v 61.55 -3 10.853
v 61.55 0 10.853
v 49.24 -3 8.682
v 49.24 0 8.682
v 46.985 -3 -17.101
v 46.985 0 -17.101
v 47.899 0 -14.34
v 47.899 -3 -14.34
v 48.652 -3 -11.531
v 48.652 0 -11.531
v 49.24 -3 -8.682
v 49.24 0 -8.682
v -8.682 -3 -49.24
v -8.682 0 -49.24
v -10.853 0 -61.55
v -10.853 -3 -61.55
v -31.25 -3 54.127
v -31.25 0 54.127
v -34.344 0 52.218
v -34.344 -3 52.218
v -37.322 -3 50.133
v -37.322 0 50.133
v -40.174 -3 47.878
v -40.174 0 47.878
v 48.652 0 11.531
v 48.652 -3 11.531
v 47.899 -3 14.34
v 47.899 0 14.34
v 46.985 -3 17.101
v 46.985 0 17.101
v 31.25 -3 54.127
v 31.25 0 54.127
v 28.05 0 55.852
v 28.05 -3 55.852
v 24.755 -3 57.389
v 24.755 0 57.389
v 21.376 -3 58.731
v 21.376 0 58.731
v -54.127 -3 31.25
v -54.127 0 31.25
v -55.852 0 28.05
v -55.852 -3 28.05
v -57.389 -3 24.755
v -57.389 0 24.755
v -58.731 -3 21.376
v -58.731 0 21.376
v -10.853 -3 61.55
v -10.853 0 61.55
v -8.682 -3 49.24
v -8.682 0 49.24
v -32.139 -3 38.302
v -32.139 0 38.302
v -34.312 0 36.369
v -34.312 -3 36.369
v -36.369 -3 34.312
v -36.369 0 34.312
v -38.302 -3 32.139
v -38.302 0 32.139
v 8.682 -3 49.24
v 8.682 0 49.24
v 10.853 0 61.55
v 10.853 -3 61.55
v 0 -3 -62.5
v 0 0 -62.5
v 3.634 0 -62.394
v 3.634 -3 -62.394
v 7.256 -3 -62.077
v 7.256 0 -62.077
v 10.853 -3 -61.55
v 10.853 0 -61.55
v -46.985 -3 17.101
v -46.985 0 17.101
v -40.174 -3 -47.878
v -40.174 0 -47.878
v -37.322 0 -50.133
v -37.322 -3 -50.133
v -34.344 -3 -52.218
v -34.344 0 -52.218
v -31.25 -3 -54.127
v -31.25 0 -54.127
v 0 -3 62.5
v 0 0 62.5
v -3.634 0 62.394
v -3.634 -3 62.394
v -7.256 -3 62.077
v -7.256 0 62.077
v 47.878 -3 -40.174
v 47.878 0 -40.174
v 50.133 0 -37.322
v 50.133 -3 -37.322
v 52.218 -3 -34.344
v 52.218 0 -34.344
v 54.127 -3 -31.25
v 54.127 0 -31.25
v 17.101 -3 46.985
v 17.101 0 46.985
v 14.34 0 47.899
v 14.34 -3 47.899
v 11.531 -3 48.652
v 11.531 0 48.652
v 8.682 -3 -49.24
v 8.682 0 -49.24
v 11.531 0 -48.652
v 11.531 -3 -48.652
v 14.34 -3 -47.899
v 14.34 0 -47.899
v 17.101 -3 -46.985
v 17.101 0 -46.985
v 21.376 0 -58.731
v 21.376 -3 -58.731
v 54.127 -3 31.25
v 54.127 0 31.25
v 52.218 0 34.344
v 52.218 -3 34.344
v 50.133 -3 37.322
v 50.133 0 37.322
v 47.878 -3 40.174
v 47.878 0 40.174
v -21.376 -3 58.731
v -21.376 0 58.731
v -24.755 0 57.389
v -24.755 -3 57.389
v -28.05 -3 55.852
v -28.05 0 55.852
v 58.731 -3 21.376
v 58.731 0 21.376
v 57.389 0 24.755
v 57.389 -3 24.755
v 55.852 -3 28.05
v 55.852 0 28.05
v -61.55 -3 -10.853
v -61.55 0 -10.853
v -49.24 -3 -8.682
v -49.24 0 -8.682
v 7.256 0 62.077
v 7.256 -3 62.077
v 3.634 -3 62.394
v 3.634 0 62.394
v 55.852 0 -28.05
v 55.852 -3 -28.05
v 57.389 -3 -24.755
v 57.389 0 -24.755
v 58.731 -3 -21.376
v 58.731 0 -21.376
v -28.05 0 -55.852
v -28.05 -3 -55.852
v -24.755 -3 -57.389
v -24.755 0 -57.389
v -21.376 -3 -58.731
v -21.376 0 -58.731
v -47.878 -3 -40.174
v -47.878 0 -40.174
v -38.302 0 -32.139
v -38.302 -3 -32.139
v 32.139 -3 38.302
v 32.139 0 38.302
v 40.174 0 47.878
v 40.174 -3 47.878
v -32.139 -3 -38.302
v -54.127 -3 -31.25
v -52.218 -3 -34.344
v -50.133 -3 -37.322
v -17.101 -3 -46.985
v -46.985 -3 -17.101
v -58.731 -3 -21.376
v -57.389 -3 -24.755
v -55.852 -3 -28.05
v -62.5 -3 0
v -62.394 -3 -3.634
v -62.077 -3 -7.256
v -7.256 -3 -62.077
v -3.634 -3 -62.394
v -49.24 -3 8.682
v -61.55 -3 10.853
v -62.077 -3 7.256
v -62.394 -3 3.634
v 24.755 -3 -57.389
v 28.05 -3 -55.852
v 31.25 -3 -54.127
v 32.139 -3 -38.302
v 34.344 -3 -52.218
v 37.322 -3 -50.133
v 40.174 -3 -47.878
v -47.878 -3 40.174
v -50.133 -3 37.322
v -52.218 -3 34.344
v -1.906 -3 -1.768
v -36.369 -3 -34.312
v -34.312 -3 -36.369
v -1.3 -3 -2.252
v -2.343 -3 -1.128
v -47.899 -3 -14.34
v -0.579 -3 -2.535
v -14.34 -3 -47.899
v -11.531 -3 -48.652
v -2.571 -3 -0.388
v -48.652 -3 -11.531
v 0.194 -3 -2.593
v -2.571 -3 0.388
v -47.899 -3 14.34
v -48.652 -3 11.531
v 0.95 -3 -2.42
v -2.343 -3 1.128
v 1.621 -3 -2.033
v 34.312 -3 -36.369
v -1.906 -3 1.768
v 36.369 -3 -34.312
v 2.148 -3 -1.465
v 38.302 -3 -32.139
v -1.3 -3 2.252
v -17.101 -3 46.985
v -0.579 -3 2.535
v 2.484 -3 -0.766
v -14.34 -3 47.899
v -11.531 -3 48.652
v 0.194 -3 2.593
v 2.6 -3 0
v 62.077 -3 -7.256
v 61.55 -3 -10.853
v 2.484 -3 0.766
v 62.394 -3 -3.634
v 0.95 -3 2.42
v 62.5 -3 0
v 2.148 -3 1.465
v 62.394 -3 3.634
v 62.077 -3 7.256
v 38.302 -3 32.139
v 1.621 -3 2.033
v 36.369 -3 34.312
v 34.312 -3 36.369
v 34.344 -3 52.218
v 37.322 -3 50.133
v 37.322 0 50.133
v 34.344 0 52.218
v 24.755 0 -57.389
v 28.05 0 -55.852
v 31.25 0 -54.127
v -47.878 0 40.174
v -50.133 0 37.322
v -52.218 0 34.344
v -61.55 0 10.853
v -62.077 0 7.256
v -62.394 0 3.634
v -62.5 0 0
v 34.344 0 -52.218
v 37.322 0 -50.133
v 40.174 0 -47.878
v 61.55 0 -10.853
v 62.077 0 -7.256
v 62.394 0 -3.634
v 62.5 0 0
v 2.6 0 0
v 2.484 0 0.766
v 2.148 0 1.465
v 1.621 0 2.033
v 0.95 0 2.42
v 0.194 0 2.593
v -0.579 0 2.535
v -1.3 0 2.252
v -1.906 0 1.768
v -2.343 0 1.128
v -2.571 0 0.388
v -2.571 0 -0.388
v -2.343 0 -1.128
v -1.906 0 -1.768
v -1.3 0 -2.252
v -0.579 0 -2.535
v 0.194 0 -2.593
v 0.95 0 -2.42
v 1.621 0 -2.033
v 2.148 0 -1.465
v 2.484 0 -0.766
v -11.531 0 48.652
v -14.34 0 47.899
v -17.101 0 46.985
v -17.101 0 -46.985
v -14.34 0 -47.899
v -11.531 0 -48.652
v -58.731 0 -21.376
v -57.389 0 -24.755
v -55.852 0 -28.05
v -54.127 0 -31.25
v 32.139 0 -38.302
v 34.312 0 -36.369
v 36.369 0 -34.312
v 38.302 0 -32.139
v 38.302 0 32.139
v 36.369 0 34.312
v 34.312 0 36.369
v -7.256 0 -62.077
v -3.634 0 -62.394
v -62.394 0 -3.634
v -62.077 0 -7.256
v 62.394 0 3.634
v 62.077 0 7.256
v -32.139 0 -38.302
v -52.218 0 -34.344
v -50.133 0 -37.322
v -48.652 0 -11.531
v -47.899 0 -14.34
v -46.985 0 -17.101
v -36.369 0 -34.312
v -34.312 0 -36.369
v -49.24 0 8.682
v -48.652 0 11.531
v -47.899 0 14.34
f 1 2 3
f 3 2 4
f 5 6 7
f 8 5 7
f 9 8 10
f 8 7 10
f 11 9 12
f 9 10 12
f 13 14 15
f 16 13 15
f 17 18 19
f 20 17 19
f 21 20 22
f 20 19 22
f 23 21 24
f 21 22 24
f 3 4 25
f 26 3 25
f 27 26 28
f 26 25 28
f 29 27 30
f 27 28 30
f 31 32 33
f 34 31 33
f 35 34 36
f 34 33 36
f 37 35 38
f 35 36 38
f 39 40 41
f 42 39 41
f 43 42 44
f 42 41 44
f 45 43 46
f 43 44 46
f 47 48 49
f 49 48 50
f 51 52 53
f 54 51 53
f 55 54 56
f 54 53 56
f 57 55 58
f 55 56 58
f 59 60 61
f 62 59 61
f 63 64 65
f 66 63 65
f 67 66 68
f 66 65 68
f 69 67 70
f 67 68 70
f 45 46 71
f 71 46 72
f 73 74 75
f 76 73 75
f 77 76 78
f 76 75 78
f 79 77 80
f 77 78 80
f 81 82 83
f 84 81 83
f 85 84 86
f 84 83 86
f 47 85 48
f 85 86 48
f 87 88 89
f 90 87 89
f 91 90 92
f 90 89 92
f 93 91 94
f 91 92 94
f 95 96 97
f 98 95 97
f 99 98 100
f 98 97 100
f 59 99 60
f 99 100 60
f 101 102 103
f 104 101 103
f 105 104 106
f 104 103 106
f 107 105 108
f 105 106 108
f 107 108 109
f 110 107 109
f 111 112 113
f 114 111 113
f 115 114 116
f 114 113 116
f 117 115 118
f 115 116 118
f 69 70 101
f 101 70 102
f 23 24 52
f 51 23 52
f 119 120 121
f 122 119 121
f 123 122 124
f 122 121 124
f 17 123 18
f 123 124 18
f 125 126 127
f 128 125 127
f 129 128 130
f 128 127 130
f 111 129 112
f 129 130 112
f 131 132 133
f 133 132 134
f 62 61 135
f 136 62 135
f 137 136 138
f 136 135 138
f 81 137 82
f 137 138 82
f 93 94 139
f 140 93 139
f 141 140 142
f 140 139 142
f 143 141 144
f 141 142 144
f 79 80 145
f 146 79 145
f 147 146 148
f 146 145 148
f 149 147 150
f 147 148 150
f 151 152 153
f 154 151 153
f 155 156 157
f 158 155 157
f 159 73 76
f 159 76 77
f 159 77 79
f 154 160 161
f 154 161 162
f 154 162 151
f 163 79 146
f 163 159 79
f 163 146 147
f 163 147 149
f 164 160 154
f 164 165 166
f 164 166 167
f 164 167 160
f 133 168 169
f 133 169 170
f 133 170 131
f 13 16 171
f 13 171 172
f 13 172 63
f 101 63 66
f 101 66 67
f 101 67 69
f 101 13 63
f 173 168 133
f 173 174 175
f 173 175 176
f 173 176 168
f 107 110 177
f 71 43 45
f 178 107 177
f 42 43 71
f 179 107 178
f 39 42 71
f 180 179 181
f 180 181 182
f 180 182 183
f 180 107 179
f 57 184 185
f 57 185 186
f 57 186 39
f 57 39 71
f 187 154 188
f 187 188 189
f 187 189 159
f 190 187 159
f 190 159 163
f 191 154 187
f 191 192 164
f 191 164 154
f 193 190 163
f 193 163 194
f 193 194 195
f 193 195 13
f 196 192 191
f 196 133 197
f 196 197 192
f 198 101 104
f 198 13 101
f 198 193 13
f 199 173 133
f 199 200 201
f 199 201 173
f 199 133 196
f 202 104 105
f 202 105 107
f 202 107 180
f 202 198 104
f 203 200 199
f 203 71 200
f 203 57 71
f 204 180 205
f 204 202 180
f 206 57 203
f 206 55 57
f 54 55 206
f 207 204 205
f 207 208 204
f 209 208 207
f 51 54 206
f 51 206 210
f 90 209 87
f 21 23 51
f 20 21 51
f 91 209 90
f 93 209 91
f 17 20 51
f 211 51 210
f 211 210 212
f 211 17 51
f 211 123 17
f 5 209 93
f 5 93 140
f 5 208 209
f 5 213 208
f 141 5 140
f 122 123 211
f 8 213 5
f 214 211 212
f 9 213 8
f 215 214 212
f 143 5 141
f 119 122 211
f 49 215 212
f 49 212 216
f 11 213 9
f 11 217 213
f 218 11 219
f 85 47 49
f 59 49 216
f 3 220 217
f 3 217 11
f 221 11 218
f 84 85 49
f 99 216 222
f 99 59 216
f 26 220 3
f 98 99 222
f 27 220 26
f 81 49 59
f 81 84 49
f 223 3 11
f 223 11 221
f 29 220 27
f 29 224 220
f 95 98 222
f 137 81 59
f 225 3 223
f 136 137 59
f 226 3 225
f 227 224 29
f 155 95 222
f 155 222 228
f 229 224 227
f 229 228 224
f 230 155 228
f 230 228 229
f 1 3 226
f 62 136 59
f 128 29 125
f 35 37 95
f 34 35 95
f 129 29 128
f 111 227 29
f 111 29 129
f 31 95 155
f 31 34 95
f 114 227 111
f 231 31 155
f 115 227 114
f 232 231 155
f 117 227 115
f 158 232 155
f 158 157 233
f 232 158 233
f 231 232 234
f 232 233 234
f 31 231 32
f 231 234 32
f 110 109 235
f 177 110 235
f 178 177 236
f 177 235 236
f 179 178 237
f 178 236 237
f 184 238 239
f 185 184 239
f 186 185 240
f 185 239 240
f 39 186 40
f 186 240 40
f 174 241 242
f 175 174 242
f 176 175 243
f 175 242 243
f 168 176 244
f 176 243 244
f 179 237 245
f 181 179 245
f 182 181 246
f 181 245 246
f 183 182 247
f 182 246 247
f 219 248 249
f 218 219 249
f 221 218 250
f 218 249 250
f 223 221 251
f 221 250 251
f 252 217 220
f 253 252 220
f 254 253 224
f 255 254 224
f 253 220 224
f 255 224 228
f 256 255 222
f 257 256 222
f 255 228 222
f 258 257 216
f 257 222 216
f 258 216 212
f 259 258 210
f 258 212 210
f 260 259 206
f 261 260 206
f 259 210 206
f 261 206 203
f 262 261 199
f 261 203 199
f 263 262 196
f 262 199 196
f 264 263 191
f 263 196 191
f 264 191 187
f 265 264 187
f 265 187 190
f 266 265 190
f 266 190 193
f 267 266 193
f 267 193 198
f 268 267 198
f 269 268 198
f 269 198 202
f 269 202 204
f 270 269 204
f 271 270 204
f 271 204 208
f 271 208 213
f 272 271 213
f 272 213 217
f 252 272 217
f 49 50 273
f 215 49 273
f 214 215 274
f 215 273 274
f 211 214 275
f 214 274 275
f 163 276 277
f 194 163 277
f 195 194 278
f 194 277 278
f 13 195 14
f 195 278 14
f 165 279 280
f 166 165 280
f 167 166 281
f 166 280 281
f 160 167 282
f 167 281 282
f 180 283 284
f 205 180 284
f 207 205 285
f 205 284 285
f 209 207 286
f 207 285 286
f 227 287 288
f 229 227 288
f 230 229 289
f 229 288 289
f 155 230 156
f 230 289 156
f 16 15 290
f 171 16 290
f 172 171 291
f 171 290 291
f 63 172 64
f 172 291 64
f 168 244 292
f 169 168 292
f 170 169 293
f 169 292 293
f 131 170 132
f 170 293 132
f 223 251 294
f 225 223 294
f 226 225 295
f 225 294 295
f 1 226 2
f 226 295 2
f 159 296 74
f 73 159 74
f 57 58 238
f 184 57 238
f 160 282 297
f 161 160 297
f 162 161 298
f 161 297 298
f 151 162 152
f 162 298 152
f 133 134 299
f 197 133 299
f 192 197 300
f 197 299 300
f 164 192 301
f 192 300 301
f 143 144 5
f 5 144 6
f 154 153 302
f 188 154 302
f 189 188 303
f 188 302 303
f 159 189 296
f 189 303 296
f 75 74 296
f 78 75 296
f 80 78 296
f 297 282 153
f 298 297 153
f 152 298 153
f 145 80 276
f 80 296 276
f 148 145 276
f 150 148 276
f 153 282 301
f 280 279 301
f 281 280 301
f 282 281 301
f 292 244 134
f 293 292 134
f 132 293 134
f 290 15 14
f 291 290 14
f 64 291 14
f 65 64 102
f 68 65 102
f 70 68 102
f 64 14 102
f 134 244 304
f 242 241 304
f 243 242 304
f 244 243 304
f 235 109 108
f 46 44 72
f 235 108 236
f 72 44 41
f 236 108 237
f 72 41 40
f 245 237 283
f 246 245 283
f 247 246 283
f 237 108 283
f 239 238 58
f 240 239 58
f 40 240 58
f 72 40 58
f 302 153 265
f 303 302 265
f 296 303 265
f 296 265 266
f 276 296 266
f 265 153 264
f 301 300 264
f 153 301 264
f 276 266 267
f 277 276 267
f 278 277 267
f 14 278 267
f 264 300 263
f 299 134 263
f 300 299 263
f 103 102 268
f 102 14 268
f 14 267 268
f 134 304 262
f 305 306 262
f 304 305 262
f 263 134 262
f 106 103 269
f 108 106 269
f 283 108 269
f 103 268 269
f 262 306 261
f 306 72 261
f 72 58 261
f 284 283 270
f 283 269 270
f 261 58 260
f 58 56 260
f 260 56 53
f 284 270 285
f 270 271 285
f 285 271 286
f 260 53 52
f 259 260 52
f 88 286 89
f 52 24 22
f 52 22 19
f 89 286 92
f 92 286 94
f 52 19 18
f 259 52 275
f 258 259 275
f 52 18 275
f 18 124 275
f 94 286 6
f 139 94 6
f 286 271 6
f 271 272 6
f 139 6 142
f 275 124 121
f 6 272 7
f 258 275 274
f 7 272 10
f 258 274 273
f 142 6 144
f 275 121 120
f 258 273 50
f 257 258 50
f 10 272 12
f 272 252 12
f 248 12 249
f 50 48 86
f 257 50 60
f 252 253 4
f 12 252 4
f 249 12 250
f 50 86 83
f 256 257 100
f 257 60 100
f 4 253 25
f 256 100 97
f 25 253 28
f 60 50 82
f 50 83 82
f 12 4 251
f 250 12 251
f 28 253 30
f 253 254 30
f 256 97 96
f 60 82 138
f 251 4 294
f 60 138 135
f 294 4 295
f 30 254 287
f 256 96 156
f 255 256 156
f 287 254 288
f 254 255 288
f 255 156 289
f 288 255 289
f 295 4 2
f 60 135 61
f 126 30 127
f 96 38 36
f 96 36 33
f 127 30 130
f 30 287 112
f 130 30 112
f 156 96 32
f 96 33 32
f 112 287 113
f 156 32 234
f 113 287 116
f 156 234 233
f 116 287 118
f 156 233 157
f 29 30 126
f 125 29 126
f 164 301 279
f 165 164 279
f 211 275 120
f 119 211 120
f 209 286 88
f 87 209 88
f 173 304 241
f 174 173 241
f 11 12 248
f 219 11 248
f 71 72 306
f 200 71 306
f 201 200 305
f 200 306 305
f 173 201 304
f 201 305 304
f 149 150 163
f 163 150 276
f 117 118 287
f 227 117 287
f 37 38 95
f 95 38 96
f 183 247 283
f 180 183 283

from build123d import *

# Parameters (mm, degrees)
F1_DEPTH = 3
F2_R     = 2.6
F3_DEPTH = 3.001


with BuildPart() as f1:
    # F0 (on Front) → F1 (new body)
    with BuildSketch(Plane.XZ):
        with BuildLine():
            Line((0, 0), (50, 0))
            ThreePointArc((50, 0), (49.8097349046, 4.3577871374), (49.2403876506, 8.6824088833))
            Line((49.2403876506, 8.6824088833), (0, 0))
        make_face()
        with BuildLine():
            Line((62.5, 0), (50, 0))
            ThreePointArc((50, 0), (49.8097349046, -4.3577871374), (49.2403876506, -8.6824088833))
            Line((49.2403876506, -8.6824088833), (61.5504845633, -10.8530111042))
            ThreePointArc((61.5504845633, -10.8530111042), (62.2621686307, -5.4472339217), (62.5, 0))
        make_face()
        with BuildLine():
            ThreePointArc((49.2403876506, -8.6824088833), (49.8097349046, -4.3577871374), (50, 0))
            Line((50, 0), (0, 0))
            Line((0, 0), (49.2403876506, -8.6824088833))
        make_face()
        with BuildLine():
            ThreePointArc((49.2403876506, 8.6824088833), (49.8097349046, 4.3577871374), (50, 0))
            Line((50, 0), (62.5, 0))
            ThreePointArc((62.5, 0), (62.2621686307, 5.4472339217), (61.5504845633, 10.8530111042))
            Line((61.5504845633, 10.8530111042), (49.2403876506, 8.6824088833))
        make_face()
        with BuildLine():
            Line((0, 0), (49.2403876506, 8.6824088833))
            ThreePointArc((49.2403876506, 8.6824088833), (48.2962913145, 12.9409522551), (46.9846310393, 17.1010071663))
            Line((46.9846310393, 17.1010071663), (0, 0))
        make_face()
        with BuildLine():
            ThreePointArc((46.9846310393, -17.1010071663), (48.2962913145, -12.9409522551), (49.2403876506, -8.6824088833))
            Line((49.2403876506, -8.6824088833), (0, 0))
            Line((0, 0), (46.9846310393, -17.1010071663))
        make_face()
        with BuildLine():
            Line((-8.6824088833, 49.2403876506), (0, 0))
            Line((0, 0), (0, 50))
            ThreePointArc((0, 50), (-4.3577871374, 49.8097349046), (-8.6824088833, 49.2403876506))
        make_face()
        with BuildLine():
            Line((8.6824088833, -49.2403876506), (0, 0))
            Line((0, 0), (0, -50))
            ThreePointArc((0, -50), (4.3577871374, -49.8097349046), (8.6824088833, -49.2403876506))
        make_face()
        with BuildLine():
            Line((-49.2403876506, -8.6824088833), (0, 0))
            Line((0, 0), (-50, 0))
            ThreePointArc((-50, 0), (-49.8097349046, -4.3577871374), (-49.2403876506, -8.6824088833))
        make_face()
        with BuildLine():
            Line((17.1010071663, 46.9846310393), (0, 0))
            Line((0, 0), (25, 43.3012701892))
            ThreePointArc((25, 43.3012701892), (21.130913087, 45.3153893518), (17.1010071663, 46.9846310393))
        make_face()
        with BuildLine():
            Line((38.3022221559, 32.1393804843), (0, 0))
            Line((0, 0), (43.3012701892, 25))
            ThreePointArc((43.3012701892, 25), (40.9576022144, 28.6788218176), (38.3022221559, 32.1393804843))
        make_face()
        with BuildLine():
            Line((46.9846310393, -17.1010071663), (0, 0))
            Line((0, 0), (43.3012701892, -25))
            ThreePointArc((43.3012701892, -25), (45.3153893518, -21.130913087), (46.9846310393, -17.1010071663))
        make_face()
        with BuildLine():
            Line((32.1393804843, -38.3022221559), (0, 0))
            Line((0, 0), (25, -43.3012701892))
            ThreePointArc((25, -43.3012701892), (28.6788218176, -40.9576022144), (32.1393804843, -38.3022221559))
        make_face()
        with BuildLine():
            Line((-32.1393804843, 38.3022221559), (0, 0))
            Line((0, 0), (-25, 43.3012701892))
            ThreePointArc((-25, 43.3012701892), (-28.6788218176, 40.9576022144), (-32.1393804843, 38.3022221559))
        make_face()
        with BuildLine():
            Line((-46.9846310393, 17.1010071663), (0, 0))
            Line((0, 0), (-43.3012701892, 25))
            ThreePointArc((-43.3012701892, 25), (-45.3153893518, 21.130913087), (-46.9846310393, 17.1010071663))
        make_face()
        with BuildLine():
            Line((-38.3022221559, -32.1393804843), (0, 0))
            Line((0, 0), (-43.3012701892, -25))
            ThreePointArc((-43.3012701892, -25), (-40.9576022144, -28.6788218176), (-38.3022221559, -32.1393804843))
        make_face()
        with BuildLine():
            Line((-17.1010071663, -46.9846310393), (0, 0))
            Line((0, 0), (-25, -43.3012701892))
            ThreePointArc((-25, -43.3012701892), (-21.130913087, -45.3153893518), (-17.1010071663, -46.9846310393))
        make_face()
        with BuildLine():
            Line((-17.1010071663, 46.9846310393), (0, 0))
            Line((0, 0), (-8.6824088833, 49.2403876506))
            ThreePointArc((-8.6824088833, 49.2403876506), (-12.9409522551, 48.2962913145), (-17.1010071663, 46.9846310393))
        make_face()
        with BuildLine():
            Line((0, 50), (0, 0))
            Line((0, 0), (8.6824088833, 49.2403876506))
            ThreePointArc((8.6824088833, 49.2403876506), (4.3577871374, 49.8097349046), (0, 50))
        make_face()
        with BuildLine():
            Line((8.6824088833, 49.2403876506), (0, 0))
            Line((0, 0), (17.1010071663, 46.9846310393))
            ThreePointArc((17.1010071663, 46.9846310393), (12.9409522551, 48.2962913145), (8.6824088833, 49.2403876506))
        make_face()
        with BuildLine():
            Line((25, 43.3012701892), (0, 0))
            Line((0, 0), (32.1393804843, 38.3022221559))
            ThreePointArc((32.1393804843, 38.3022221559), (28.6788218176, 40.9576022144), (25, 43.3012701892))
        make_face()
        with BuildLine():
            Line((32.1393804843, 38.3022221559), (0, 0))
            Line((0, 0), (38.3022221559, 32.1393804843))
            ThreePointArc((38.3022221559, 32.1393804843), (35.3553390593, 35.3553390593), (32.1393804843, 38.3022221559))
        make_face()
        with BuildLine():
            Line((43.3012701892, 25), (0, 0))
            Line((0, 0), (46.9846310393, 17.1010071663))
            ThreePointArc((46.9846310393, 17.1010071663), (45.3153893518, 21.130913087), (43.3012701892, 25))
        make_face()
        with BuildLine():
            Line((43.3012701892, -25), (0, 0))
            Line((0, 0), (38.3022221559, -32.1393804843))
            ThreePointArc((38.3022221559, -32.1393804843), (40.9576022144, -28.6788218176), (43.3012701892, -25))
        make_face()
        with BuildLine():
            Line((38.3022221559, -32.1393804843), (0, 0))
            Line((0, 0), (32.1393804843, -38.3022221559))
            ThreePointArc((32.1393804843, -38.3022221559), (35.3553390593, -35.3553390593), (38.3022221559, -32.1393804843))
        make_face()
        with BuildLine():
            Line((25, -43.3012701892), (0, 0))
            Line((0, 0), (17.1010071663, -46.9846310393))
            ThreePointArc((17.1010071663, -46.9846310393), (21.130913087, -45.3153893518), (25, -43.3012701892))
        make_face()
        with BuildLine():
            Line((17.1010071663, -46.9846310393), (0, 0))
            Line((0, 0), (8.6824088833, -49.2403876506))
            ThreePointArc((8.6824088833, -49.2403876506), (12.9409522551, -48.2962913145), (17.1010071663, -46.9846310393))
        make_face()
        with BuildLine():
            Line((0, -50), (0, 0))
            Line((0, 0), (-8.6824088833, -49.2403876506))
            ThreePointArc((-8.6824088833, -49.2403876506), (-4.3577871374, -49.8097349046), (0, -50))
        make_face()
        with BuildLine():
            Line((-8.6824088833, -49.2403876506), (0, 0))
            Line((0, 0), (-17.1010071663, -46.9846310393))
            ThreePointArc((-17.1010071663, -46.9846310393), (-12.9409522551, -48.2962913145), (-8.6824088833, -49.2403876506))
        make_face()
        with BuildLine():
            Line((-25, -43.3012701892), (0, 0))
            Line((0, 0), (-32.1393804843, -38.3022221559))
            ThreePointArc((-32.1393804843, -38.3022221559), (-28.6788218176, -40.9576022144), (-25, -43.3012701892))
        make_face()
        with BuildLine():
            Line((-32.1393804843, -38.3022221559), (0, 0))
            Line((0, 0), (-38.3022221559, -32.1393804843))
            ThreePointArc((-38.3022221559, -32.1393804843), (-35.3553390593, -35.3553390593), (-32.1393804843, -38.3022221559))
        make_face()
        with BuildLine():
            Line((-43.3012701892, -25), (0, 0))
            Line((0, 0), (-46.9846310393, -17.1010071663))
            ThreePointArc((-46.9846310393, -17.1010071663), (-45.3153893518, -21.130913087), (-43.3012701892, -25))
        make_face()
        with BuildLine():
            Line((-46.9846310393, -17.1010071663), (0, 0))
            Line((0, 0), (-49.2403876506, -8.6824088833))
            ThreePointArc((-49.2403876506, -8.6824088833), (-48.2962913145, -12.9409522551), (-46.9846310393, -17.1010071663))
        make_face()
        with BuildLine():
            Line((-49.2403876506, 8.6824088833), (0, 0))
            Line((0, 0), (-46.9846310393, 17.1010071663))
            ThreePointArc((-46.9846310393, 17.1010071663), (-48.2962913145, 12.9409522551), (-49.2403876506, 8.6824088833))
        make_face()
        with BuildLine():
            Line((-43.3012701892, 25), (0, 0))
            Line((0, 0), (-38.3022221559, 32.1393804843))
            ThreePointArc((-38.3022221559, 32.1393804843), (-40.9576022144, 28.6788218176), (-43.3012701892, 25))
        make_face()
        with BuildLine():
            Line((-38.3022221559, 32.1393804843), (0, 0))
            Line((0, 0), (-32.1393804843, 38.3022221559))
            ThreePointArc((-32.1393804843, 38.3022221559), (-35.3553390593, 35.3553390593), (-38.3022221559, 32.1393804843))
        make_face()
        with BuildLine():
            Line((-25, 43.3012701892), (0, 0))
            Line((0, 0), (-17.1010071663, 46.9846310393))
            ThreePointArc((-17.1010071663, 46.9846310393), (-21.130913087, 45.3153893518), (-25, 43.3012701892))
        make_face()
        with BuildLine():
            Line((-50, 0), (0, 0))
            Line((0, 0), (-49.2403876506, 8.6824088833))
            ThreePointArc((-49.2403876506, 8.6824088833), (-49.8097349046, 4.3577871374), (-50, 0))
        make_face()
        with BuildLine():
            ThreePointArc((43.3012701892, 25), (45.3153893518, 21.130913087), (46.9846310393, 17.1010071663))
            Line((46.9846310393, 17.1010071663), (58.7307887991, 21.3762589579))
            ThreePointArc((58.7307887991, 21.3762589579), (56.6442366898, 26.4136413588), (54.1265877365, 31.25))
            Line((54.1265877365, 31.25), (43.3012701892, 25))
        make_face()
        with BuildLine():
            Line((58.7307887991, -21.3762589579), (46.9846310393, -17.1010071663))
            ThreePointArc((46.9846310393, -17.1010071663), (45.3153893518, -21.130913087), (43.3012701892, -25))
            Line((43.3012701892, -25), (54.1265877365, -31.25))
            ThreePointArc((54.1265877365, -31.25), (56.6442366898, -26.4136413588), (58.7307887991, -21.3762589579))
        make_face()
        with BuildLine():
            Line((0, 62.5), (0, 50))
            ThreePointArc((0, 50), (4.3577871374, 49.8097349046), (8.6824088833, 49.2403876506))
            Line((8.6824088833, 49.2403876506), (10.8530111042, 61.5504845633))
            ThreePointArc((10.8530111042, 61.5504845633), (5.4472339217, 62.2621686307), (0, 62.5))
        make_face()
        with BuildLine():
            ThreePointArc((-8.6824088833, 49.2403876506), (-4.3577871374, 49.8097349046), (0, 50))
            Line((0, 50), (0, 62.5))
            ThreePointArc((0, 62.5), (-5.4472339217, 62.2621686307), (-10.8530111042, 61.5504845633))
            Line((-10.8530111042, 61.5504845633), (-8.6824088833, 49.2403876506))
        make_face()
        with BuildLine():
            Line((0, -62.5), (0, -50))
            ThreePointArc((0, -50), (-4.3577871374, -49.8097349046), (-8.6824088833, -49.2403876506))
            Line((-8.6824088833, -49.2403876506), (-10.8530111042, -61.5504845633))
            ThreePointArc((-10.8530111042, -61.5504845633), (-5.4472339217, -62.2621686307), (0, -62.5))
        make_face()
        with BuildLine():
            ThreePointArc((8.6824088833, -49.2403876506), (4.3577871374, -49.8097349046), (0, -50))
            Line((0, -50), (0, -62.5))
            ThreePointArc((0, -62.5), (5.4472339217, -62.2621686307), (10.8530111042, -61.5504845633))
            Line((10.8530111042, -61.5504845633), (8.6824088833, -49.2403876506))
        make_face()
        with BuildLine():
            Line((-62.5, 0), (-50, 0))
            ThreePointArc((-50, 0), (-49.8097349046, 4.3577871374), (-49.2403876506, 8.6824088833))
            Line((-49.2403876506, 8.6824088833), (-61.5504845633, 10.8530111042))
            ThreePointArc((-61.5504845633, 10.8530111042), (-62.2621686307, 5.4472339217), (-62.5, 0))
        make_face()
        with BuildLine():
            ThreePointArc((-49.2403876506, -8.6824088833), (-49.8097349046, -4.3577871374), (-50, 0))
            Line((-50, 0), (-62.5, 0))
            ThreePointArc((-62.5, 0), (-62.2621686307, -5.4472339217), (-61.5504845633, -10.8530111042))
            Line((-61.5504845633, -10.8530111042), (-49.2403876506, -8.6824088833))
        make_face()
        with BuildLine():
            Line((31.25, 54.1265877365), (25, 43.3012701892))
            ThreePointArc((25, 43.3012701892), (28.6788218176, 40.9576022144), (32.1393804843, 38.3022221559))
            Line((32.1393804843, 38.3022221559), (40.1742256054, 47.8777776949))
            ThreePointArc((40.1742256054, 47.8777776949), (35.8485272719, 51.1970027681), (31.25, 54.1265877365))
        make_face()
        with BuildLine():
            ThreePointArc((17.1010071663, 46.9846310393), (21.130913087, 45.3153893518), (25, 43.3012701892))
            Line((25, 43.3012701892), (31.25, 54.1265877365))
            ThreePointArc((31.25, 54.1265877365), (26.4136413588, 56.6442366898), (21.3762589579, 58.7307887991))
            Line((21.3762589579, 58.7307887991), (17.1010071663, 46.9846310393))
        make_face()
        with BuildLine():
            ThreePointArc((38.3022221559, 32.1393804843), (40.9576022144, 28.6788218176), (43.3012701892, 25))
            Line((43.3012701892, 25), (54.1265877365, 31.25))
            ThreePointArc((54.1265877365, 31.25), (51.1970027681, 35.8485272719), (47.8777776949, 40.1742256054))
            Line((47.8777776949, 40.1742256054), (38.3022221559, 32.1393804843))
        make_face()
        with BuildLine():
            Line((54.1265877365, -31.25), (43.3012701892, -25))
            ThreePointArc((43.3012701892, -25), (40.9576022144, -28.6788218176), (38.3022221559, -32.1393804843))
            Line((38.3022221559, -32.1393804843), (47.8777776949, -40.1742256054))
            ThreePointArc((47.8777776949, -40.1742256054), (51.1970027681, -35.8485272719), (54.1265877365, -31.25))
        make_face()
        with BuildLine():
            Line((31.25, -54.1265877365), (25, -43.3012701892))
            ThreePointArc((25, -43.3012701892), (21.130913087, -45.3153893518), (17.1010071663, -46.9846310393))
            Line((17.1010071663, -46.9846310393), (21.3762589579, -58.7307887991))
            ThreePointArc((21.3762589579, -58.7307887991), (26.4136413588, -56.6442366898), (31.25, -54.1265877365))
        make_face()
        with BuildLine():
            ThreePointArc((32.1393804843, -38.3022221559), (28.6788218176, -40.9576022144), (25, -43.3012701892))
            Line((25, -43.3012701892), (31.25, -54.1265877365))
            ThreePointArc((31.25, -54.1265877365), (35.8485272719, -51.1970027681), (40.1742256054, -47.8777776949))
            Line((40.1742256054, -47.8777776949), (32.1393804843, -38.3022221559))
        make_face()
        with BuildLine():
            Line((-31.25, 54.1265877365), (-25, 43.3012701892))
            ThreePointArc((-25, 43.3012701892), (-21.130913087, 45.3153893518), (-17.1010071663, 46.9846310393))
            Line((-17.1010071663, 46.9846310393), (-21.3762589579, 58.7307887991))
            ThreePointArc((-21.3762589579, 58.7307887991), (-26.4136413588, 56.6442366898), (-31.25, 54.1265877365))
        make_face()
        with BuildLine():
            ThreePointArc((-32.1393804843, 38.3022221559), (-28.6788218176, 40.9576022144), (-25, 43.3012701892))
            Line((-25, 43.3012701892), (-31.25, 54.1265877365))
            ThreePointArc((-31.25, 54.1265877365), (-35.8485272719, 51.1970027681), (-40.1742256054, 47.8777776949))
            Line((-40.1742256054, 47.8777776949), (-32.1393804843, 38.3022221559))
        make_face()
        with BuildLine():
            Line((-54.1265877365, 31.25), (-43.3012701892, 25))
            ThreePointArc((-43.3012701892, 25), (-40.9576022144, 28.6788218176), (-38.3022221559, 32.1393804843))
            Line((-38.3022221559, 32.1393804843), (-47.8777776949, 40.1742256054))
            ThreePointArc((-47.8777776949, 40.1742256054), (-51.1970027681, 35.8485272719), (-54.1265877365, 31.25))
        make_face()
        with BuildLine():
            ThreePointArc((-46.9846310393, 17.1010071663), (-45.3153893518, 21.130913087), (-43.3012701892, 25))
            Line((-43.3012701892, 25), (-54.1265877365, 31.25))
            ThreePointArc((-54.1265877365, 31.25), (-56.6442366898, 26.4136413588), (-58.7307887991, 21.3762589579))
            Line((-58.7307887991, 21.3762589579), (-46.9846310393, 17.1010071663))
        make_face()
        with BuildLine():
            Line((-54.1265877365, -31.25), (-43.3012701892, -25))
            ThreePointArc((-43.3012701892, -25), (-45.3153893518, -21.130913087), (-46.9846310393, -17.1010071663))
            Line((-46.9846310393, -17.1010071663), (-58.7307887991, -21.3762589579))
            ThreePointArc((-58.7307887991, -21.3762589579), (-56.6442366898, -26.4136413588), (-54.1265877365, -31.25))
        make_face()
        with BuildLine():
            ThreePointArc((-38.3022221559, -32.1393804843), (-40.9576022144, -28.6788218176), (-43.3012701892, -25))
            Line((-43.3012701892, -25), (-54.1265877365, -31.25))
            ThreePointArc((-54.1265877365, -31.25), (-51.1970027681, -35.8485272719), (-47.8777776949, -40.1742256054))
            Line((-47.8777776949, -40.1742256054), (-38.3022221559, -32.1393804843))
        make_face()
        with BuildLine():
            Line((-31.25, -54.1265877365), (-25, -43.3012701892))
            ThreePointArc((-25, -43.3012701892), (-28.6788218176, -40.9576022144), (-32.1393804843, -38.3022221559))
            Line((-32.1393804843, -38.3022221559), (-40.1742256054, -47.8777776949))
            ThreePointArc((-40.1742256054, -47.8777776949), (-35.8485272719, -51.1970027681), (-31.25, -54.1265877365))
        make_face()
        with BuildLine():
            ThreePointArc((-17.1010071663, -46.9846310393), (-21.130913087, -45.3153893518), (-25, -43.3012701892))
            Line((-25, -43.3012701892), (-31.25, -54.1265877365))
            ThreePointArc((-31.25, -54.1265877365), (-26.4136413588, -56.6442366898), (-21.3762589579, -58.7307887991))
            Line((-21.3762589579, -58.7307887991), (-17.1010071663, -46.9846310393))
        make_face()
    extrude(amount=F1_DEPTH)

    # F2 (on face) → F3 (cut, through all)
    with BuildSketch(Plane.XZ.offset(3)):
        Circle(F2_R)
    extrude(amount=-F3_DEPTH, mode=Mode.SUBTRACT)


solid = f1.part
